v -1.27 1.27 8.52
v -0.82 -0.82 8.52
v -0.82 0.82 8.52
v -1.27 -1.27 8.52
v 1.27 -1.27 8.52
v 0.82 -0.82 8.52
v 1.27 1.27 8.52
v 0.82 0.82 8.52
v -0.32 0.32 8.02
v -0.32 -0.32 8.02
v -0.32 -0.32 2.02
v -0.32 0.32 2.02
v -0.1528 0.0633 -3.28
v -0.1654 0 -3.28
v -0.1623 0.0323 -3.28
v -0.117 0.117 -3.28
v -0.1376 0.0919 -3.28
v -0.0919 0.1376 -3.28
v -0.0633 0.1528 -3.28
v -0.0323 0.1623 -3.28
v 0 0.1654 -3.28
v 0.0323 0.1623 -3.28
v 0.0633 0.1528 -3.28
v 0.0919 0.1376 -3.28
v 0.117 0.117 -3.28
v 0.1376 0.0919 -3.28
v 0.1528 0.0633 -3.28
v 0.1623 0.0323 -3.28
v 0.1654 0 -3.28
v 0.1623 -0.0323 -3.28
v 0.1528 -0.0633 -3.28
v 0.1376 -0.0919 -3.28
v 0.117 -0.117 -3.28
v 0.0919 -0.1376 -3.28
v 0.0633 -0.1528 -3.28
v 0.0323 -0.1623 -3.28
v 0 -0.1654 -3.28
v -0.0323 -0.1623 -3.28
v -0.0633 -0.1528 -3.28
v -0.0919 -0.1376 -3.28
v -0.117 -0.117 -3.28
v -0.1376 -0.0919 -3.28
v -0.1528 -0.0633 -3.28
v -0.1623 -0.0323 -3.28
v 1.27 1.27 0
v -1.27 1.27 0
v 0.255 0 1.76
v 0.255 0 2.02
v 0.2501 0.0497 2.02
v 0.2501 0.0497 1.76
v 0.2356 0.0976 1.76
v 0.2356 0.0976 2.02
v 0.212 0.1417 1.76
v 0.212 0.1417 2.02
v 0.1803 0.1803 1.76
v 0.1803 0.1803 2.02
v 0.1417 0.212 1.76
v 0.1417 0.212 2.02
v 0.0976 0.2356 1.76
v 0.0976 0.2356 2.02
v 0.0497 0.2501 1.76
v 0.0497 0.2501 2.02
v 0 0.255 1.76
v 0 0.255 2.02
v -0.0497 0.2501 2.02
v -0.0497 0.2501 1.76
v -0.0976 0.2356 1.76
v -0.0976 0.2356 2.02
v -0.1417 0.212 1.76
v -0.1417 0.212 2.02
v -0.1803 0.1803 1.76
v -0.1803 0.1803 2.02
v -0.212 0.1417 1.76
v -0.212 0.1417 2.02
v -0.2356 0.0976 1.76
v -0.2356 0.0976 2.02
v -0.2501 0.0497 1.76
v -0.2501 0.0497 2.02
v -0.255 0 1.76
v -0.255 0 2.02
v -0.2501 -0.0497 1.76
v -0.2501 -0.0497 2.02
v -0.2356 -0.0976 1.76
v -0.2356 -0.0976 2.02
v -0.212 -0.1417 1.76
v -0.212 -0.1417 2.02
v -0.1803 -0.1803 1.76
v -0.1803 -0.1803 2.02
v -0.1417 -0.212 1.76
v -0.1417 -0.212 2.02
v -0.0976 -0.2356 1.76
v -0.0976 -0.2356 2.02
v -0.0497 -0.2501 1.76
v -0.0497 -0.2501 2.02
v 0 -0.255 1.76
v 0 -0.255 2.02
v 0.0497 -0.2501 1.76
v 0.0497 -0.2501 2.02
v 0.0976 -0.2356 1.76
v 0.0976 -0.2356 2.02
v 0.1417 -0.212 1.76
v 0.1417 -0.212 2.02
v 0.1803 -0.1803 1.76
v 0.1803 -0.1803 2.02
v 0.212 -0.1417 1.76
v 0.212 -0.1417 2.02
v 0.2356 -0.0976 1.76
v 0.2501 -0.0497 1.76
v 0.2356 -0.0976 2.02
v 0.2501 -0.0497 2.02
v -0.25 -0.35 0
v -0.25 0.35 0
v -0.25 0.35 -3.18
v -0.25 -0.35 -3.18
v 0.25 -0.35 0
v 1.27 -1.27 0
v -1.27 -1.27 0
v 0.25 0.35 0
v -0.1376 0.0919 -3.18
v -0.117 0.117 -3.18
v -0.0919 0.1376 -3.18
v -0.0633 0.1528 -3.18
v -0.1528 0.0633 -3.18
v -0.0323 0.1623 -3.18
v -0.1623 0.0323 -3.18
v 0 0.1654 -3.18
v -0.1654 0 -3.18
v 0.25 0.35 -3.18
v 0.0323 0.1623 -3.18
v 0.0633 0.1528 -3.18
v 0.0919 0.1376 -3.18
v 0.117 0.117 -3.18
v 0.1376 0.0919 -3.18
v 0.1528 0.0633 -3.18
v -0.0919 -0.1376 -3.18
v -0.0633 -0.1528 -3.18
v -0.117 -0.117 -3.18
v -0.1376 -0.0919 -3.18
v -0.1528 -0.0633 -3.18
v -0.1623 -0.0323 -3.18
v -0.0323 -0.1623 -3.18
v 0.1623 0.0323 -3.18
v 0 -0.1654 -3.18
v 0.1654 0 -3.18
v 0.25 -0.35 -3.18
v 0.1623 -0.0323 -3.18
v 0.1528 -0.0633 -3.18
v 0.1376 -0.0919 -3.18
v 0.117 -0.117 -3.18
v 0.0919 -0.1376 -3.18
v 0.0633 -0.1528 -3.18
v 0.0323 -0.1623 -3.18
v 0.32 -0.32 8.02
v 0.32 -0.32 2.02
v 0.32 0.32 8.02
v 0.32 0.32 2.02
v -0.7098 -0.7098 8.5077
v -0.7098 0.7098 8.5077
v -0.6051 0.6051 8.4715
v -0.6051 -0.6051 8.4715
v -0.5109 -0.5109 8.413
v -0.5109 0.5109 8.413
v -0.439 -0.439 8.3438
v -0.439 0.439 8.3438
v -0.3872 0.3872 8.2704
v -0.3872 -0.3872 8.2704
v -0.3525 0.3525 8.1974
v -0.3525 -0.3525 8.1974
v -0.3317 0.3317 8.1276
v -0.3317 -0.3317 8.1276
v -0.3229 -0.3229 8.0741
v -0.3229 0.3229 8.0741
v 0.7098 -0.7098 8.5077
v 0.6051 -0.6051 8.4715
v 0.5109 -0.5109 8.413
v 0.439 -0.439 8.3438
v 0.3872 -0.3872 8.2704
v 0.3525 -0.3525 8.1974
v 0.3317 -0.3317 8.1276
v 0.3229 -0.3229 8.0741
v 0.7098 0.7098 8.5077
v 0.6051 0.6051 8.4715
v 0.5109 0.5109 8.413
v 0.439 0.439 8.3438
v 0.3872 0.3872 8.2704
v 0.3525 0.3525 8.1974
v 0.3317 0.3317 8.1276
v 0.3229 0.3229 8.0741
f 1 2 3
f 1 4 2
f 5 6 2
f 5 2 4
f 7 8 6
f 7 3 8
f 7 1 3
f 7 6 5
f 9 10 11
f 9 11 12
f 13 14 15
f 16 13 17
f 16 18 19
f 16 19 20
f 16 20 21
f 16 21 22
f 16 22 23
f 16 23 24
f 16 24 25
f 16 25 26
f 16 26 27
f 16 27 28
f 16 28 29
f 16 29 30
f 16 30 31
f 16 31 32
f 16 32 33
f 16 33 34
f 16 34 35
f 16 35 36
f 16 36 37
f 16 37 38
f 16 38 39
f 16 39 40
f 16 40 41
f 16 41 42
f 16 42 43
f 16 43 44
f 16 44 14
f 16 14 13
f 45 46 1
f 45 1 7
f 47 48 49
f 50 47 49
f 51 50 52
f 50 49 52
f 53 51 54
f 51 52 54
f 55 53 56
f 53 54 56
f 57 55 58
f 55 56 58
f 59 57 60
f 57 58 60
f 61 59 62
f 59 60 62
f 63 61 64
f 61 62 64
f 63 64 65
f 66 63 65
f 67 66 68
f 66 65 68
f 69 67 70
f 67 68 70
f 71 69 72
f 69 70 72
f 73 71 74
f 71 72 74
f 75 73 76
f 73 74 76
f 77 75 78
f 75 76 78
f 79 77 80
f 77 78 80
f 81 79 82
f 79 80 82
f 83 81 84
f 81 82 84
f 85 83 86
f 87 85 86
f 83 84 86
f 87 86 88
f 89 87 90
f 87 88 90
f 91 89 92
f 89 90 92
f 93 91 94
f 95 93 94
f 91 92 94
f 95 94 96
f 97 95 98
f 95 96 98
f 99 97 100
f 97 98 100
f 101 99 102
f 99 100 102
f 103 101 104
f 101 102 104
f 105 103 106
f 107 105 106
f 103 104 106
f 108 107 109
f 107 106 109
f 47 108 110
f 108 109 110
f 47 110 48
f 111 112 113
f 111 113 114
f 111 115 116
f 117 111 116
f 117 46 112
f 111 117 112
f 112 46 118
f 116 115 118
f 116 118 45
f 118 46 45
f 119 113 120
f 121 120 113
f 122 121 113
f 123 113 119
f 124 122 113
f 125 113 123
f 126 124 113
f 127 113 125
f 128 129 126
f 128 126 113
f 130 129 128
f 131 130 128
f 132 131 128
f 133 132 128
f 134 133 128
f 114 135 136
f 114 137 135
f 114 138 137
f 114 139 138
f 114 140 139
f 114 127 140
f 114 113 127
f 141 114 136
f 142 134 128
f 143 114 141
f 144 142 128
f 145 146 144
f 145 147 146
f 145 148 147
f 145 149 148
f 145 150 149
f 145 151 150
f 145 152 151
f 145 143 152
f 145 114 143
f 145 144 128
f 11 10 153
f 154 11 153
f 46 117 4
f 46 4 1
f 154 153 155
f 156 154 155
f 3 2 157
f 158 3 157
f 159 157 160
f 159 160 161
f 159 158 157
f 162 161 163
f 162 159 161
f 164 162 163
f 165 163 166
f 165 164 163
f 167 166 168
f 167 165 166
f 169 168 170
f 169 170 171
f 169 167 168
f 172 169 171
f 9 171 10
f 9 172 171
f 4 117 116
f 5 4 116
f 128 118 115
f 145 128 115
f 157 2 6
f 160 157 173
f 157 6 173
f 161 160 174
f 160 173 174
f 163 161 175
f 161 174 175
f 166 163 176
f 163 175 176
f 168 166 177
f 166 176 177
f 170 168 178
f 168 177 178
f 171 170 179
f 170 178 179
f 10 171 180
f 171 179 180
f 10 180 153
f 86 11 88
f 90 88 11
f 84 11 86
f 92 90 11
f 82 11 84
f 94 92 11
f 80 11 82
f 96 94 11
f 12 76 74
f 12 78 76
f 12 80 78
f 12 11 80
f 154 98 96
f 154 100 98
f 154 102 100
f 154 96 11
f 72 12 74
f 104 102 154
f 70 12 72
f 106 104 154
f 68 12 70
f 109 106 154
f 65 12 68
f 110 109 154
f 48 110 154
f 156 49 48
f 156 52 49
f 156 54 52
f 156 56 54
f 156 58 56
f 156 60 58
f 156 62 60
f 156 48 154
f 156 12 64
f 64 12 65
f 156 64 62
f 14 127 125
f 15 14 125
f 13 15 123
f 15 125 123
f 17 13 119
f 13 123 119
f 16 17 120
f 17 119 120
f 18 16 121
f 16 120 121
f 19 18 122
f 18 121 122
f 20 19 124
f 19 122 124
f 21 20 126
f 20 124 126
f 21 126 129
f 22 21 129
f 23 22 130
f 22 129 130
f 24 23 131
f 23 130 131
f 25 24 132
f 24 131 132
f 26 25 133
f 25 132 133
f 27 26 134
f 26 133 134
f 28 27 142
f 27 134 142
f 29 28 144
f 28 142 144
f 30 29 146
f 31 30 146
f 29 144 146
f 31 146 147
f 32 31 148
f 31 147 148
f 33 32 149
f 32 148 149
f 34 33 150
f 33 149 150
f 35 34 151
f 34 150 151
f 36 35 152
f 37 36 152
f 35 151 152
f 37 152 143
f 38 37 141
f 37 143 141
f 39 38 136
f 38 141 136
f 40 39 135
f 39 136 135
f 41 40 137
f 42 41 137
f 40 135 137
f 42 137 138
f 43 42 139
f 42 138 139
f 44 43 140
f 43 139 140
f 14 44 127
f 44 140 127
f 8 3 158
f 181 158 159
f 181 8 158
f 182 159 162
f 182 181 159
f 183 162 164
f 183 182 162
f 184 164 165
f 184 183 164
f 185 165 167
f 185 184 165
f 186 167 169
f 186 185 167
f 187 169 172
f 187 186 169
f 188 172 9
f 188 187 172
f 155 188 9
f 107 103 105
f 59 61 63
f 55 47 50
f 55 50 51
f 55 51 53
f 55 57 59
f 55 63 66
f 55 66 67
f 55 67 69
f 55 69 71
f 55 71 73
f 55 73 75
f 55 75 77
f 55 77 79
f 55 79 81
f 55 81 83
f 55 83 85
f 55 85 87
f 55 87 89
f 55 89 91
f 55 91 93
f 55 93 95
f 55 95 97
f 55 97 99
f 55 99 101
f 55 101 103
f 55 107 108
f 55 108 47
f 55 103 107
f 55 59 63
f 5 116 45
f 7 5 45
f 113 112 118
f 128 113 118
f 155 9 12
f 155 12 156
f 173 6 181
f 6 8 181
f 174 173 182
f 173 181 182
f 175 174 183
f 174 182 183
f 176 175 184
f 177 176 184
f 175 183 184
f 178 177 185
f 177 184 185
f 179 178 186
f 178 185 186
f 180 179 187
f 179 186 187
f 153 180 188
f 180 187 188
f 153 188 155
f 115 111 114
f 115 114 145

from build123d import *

# Parameters (mm, degrees)
SKETCH1_W           = 2.54
SKETCH1_H           = 2.54
BOSS_EXTRUDE1_DEPTH = 8.52
SKETCH2_W           = 0.64
SKETCH2_H           = 0.64
CUT_EXTRUDE1_DEPTH  = 6.5
FILLET1_R           = 0.5
SKETCH4_W           = 0.5
SKETCH4_H           = 0.7
BOSS_EXTRUDE2_DEPTH = 3.18
SKETCH5_R           = 0.255
CUT_EXTRUDE4_DEPTH  = 0.26
SKETCH6_R           = 0.165430126
BOSS_EXTRUDE3_DEPTH = 0.1


with BuildPart() as part:
    # Sketch1 → Boss-Extrude1 (new body)
    with BuildSketch(Plane.XY):
        Rectangle(SKETCH1_W, SKETCH1_H)
    extrude(amount=BOSS_EXTRUDE1_DEPTH)

    # Sketch2 → Cut-Extrude1 (cut)
    with BuildSketch(Plane.XY.offset(8.52)):
        Rectangle(SKETCH2_W, SKETCH2_H)
    extrude(amount=-CUT_EXTRUDE1_DEPTH, mode=Mode.SUBTRACT)

    # Fillet1
    fillet1_edges = [part.edges().sort_by_distance(p)[0] for p in [
        (0.32, 0, 8.52),
        (0, 0.32, 8.52),
        (-0.32, 0, 8.52),
        (0, -0.32, 8.52),
    ]]
    fillet(fillet1_edges, radius=FILLET1_R)

    # Sketch4 → Boss-Extrude2 (add)
    with BuildSketch(Plane(origin=(0, 0, 0), x_dir=(1, 0, 0), z_dir=(0, 0, -1))):
        Rectangle(SKETCH4_W, SKETCH4_H)
    extrude(amount=BOSS_EXTRUDE2_DEPTH)

    # Sketch5 → Cut-Extrude4 (cut)
    with BuildSketch(Plane.XY.offset(2.02)):
        Circle(SKETCH5_R)
    extrude(amount=-CUT_EXTRUDE4_DEPTH, mode=Mode.SUBTRACT)

    # Sketch6 → Boss-Extrude3 (add)
    with BuildSketch(Plane(origin=(0, 0, -3.18), x_dir=(-1, 0, 0), z_dir=(0, 0, -1))):
        Circle(SKETCH6_R)
    extrude(amount=BOSS_EXTRUDE3_DEPTH)


solid = part.part
